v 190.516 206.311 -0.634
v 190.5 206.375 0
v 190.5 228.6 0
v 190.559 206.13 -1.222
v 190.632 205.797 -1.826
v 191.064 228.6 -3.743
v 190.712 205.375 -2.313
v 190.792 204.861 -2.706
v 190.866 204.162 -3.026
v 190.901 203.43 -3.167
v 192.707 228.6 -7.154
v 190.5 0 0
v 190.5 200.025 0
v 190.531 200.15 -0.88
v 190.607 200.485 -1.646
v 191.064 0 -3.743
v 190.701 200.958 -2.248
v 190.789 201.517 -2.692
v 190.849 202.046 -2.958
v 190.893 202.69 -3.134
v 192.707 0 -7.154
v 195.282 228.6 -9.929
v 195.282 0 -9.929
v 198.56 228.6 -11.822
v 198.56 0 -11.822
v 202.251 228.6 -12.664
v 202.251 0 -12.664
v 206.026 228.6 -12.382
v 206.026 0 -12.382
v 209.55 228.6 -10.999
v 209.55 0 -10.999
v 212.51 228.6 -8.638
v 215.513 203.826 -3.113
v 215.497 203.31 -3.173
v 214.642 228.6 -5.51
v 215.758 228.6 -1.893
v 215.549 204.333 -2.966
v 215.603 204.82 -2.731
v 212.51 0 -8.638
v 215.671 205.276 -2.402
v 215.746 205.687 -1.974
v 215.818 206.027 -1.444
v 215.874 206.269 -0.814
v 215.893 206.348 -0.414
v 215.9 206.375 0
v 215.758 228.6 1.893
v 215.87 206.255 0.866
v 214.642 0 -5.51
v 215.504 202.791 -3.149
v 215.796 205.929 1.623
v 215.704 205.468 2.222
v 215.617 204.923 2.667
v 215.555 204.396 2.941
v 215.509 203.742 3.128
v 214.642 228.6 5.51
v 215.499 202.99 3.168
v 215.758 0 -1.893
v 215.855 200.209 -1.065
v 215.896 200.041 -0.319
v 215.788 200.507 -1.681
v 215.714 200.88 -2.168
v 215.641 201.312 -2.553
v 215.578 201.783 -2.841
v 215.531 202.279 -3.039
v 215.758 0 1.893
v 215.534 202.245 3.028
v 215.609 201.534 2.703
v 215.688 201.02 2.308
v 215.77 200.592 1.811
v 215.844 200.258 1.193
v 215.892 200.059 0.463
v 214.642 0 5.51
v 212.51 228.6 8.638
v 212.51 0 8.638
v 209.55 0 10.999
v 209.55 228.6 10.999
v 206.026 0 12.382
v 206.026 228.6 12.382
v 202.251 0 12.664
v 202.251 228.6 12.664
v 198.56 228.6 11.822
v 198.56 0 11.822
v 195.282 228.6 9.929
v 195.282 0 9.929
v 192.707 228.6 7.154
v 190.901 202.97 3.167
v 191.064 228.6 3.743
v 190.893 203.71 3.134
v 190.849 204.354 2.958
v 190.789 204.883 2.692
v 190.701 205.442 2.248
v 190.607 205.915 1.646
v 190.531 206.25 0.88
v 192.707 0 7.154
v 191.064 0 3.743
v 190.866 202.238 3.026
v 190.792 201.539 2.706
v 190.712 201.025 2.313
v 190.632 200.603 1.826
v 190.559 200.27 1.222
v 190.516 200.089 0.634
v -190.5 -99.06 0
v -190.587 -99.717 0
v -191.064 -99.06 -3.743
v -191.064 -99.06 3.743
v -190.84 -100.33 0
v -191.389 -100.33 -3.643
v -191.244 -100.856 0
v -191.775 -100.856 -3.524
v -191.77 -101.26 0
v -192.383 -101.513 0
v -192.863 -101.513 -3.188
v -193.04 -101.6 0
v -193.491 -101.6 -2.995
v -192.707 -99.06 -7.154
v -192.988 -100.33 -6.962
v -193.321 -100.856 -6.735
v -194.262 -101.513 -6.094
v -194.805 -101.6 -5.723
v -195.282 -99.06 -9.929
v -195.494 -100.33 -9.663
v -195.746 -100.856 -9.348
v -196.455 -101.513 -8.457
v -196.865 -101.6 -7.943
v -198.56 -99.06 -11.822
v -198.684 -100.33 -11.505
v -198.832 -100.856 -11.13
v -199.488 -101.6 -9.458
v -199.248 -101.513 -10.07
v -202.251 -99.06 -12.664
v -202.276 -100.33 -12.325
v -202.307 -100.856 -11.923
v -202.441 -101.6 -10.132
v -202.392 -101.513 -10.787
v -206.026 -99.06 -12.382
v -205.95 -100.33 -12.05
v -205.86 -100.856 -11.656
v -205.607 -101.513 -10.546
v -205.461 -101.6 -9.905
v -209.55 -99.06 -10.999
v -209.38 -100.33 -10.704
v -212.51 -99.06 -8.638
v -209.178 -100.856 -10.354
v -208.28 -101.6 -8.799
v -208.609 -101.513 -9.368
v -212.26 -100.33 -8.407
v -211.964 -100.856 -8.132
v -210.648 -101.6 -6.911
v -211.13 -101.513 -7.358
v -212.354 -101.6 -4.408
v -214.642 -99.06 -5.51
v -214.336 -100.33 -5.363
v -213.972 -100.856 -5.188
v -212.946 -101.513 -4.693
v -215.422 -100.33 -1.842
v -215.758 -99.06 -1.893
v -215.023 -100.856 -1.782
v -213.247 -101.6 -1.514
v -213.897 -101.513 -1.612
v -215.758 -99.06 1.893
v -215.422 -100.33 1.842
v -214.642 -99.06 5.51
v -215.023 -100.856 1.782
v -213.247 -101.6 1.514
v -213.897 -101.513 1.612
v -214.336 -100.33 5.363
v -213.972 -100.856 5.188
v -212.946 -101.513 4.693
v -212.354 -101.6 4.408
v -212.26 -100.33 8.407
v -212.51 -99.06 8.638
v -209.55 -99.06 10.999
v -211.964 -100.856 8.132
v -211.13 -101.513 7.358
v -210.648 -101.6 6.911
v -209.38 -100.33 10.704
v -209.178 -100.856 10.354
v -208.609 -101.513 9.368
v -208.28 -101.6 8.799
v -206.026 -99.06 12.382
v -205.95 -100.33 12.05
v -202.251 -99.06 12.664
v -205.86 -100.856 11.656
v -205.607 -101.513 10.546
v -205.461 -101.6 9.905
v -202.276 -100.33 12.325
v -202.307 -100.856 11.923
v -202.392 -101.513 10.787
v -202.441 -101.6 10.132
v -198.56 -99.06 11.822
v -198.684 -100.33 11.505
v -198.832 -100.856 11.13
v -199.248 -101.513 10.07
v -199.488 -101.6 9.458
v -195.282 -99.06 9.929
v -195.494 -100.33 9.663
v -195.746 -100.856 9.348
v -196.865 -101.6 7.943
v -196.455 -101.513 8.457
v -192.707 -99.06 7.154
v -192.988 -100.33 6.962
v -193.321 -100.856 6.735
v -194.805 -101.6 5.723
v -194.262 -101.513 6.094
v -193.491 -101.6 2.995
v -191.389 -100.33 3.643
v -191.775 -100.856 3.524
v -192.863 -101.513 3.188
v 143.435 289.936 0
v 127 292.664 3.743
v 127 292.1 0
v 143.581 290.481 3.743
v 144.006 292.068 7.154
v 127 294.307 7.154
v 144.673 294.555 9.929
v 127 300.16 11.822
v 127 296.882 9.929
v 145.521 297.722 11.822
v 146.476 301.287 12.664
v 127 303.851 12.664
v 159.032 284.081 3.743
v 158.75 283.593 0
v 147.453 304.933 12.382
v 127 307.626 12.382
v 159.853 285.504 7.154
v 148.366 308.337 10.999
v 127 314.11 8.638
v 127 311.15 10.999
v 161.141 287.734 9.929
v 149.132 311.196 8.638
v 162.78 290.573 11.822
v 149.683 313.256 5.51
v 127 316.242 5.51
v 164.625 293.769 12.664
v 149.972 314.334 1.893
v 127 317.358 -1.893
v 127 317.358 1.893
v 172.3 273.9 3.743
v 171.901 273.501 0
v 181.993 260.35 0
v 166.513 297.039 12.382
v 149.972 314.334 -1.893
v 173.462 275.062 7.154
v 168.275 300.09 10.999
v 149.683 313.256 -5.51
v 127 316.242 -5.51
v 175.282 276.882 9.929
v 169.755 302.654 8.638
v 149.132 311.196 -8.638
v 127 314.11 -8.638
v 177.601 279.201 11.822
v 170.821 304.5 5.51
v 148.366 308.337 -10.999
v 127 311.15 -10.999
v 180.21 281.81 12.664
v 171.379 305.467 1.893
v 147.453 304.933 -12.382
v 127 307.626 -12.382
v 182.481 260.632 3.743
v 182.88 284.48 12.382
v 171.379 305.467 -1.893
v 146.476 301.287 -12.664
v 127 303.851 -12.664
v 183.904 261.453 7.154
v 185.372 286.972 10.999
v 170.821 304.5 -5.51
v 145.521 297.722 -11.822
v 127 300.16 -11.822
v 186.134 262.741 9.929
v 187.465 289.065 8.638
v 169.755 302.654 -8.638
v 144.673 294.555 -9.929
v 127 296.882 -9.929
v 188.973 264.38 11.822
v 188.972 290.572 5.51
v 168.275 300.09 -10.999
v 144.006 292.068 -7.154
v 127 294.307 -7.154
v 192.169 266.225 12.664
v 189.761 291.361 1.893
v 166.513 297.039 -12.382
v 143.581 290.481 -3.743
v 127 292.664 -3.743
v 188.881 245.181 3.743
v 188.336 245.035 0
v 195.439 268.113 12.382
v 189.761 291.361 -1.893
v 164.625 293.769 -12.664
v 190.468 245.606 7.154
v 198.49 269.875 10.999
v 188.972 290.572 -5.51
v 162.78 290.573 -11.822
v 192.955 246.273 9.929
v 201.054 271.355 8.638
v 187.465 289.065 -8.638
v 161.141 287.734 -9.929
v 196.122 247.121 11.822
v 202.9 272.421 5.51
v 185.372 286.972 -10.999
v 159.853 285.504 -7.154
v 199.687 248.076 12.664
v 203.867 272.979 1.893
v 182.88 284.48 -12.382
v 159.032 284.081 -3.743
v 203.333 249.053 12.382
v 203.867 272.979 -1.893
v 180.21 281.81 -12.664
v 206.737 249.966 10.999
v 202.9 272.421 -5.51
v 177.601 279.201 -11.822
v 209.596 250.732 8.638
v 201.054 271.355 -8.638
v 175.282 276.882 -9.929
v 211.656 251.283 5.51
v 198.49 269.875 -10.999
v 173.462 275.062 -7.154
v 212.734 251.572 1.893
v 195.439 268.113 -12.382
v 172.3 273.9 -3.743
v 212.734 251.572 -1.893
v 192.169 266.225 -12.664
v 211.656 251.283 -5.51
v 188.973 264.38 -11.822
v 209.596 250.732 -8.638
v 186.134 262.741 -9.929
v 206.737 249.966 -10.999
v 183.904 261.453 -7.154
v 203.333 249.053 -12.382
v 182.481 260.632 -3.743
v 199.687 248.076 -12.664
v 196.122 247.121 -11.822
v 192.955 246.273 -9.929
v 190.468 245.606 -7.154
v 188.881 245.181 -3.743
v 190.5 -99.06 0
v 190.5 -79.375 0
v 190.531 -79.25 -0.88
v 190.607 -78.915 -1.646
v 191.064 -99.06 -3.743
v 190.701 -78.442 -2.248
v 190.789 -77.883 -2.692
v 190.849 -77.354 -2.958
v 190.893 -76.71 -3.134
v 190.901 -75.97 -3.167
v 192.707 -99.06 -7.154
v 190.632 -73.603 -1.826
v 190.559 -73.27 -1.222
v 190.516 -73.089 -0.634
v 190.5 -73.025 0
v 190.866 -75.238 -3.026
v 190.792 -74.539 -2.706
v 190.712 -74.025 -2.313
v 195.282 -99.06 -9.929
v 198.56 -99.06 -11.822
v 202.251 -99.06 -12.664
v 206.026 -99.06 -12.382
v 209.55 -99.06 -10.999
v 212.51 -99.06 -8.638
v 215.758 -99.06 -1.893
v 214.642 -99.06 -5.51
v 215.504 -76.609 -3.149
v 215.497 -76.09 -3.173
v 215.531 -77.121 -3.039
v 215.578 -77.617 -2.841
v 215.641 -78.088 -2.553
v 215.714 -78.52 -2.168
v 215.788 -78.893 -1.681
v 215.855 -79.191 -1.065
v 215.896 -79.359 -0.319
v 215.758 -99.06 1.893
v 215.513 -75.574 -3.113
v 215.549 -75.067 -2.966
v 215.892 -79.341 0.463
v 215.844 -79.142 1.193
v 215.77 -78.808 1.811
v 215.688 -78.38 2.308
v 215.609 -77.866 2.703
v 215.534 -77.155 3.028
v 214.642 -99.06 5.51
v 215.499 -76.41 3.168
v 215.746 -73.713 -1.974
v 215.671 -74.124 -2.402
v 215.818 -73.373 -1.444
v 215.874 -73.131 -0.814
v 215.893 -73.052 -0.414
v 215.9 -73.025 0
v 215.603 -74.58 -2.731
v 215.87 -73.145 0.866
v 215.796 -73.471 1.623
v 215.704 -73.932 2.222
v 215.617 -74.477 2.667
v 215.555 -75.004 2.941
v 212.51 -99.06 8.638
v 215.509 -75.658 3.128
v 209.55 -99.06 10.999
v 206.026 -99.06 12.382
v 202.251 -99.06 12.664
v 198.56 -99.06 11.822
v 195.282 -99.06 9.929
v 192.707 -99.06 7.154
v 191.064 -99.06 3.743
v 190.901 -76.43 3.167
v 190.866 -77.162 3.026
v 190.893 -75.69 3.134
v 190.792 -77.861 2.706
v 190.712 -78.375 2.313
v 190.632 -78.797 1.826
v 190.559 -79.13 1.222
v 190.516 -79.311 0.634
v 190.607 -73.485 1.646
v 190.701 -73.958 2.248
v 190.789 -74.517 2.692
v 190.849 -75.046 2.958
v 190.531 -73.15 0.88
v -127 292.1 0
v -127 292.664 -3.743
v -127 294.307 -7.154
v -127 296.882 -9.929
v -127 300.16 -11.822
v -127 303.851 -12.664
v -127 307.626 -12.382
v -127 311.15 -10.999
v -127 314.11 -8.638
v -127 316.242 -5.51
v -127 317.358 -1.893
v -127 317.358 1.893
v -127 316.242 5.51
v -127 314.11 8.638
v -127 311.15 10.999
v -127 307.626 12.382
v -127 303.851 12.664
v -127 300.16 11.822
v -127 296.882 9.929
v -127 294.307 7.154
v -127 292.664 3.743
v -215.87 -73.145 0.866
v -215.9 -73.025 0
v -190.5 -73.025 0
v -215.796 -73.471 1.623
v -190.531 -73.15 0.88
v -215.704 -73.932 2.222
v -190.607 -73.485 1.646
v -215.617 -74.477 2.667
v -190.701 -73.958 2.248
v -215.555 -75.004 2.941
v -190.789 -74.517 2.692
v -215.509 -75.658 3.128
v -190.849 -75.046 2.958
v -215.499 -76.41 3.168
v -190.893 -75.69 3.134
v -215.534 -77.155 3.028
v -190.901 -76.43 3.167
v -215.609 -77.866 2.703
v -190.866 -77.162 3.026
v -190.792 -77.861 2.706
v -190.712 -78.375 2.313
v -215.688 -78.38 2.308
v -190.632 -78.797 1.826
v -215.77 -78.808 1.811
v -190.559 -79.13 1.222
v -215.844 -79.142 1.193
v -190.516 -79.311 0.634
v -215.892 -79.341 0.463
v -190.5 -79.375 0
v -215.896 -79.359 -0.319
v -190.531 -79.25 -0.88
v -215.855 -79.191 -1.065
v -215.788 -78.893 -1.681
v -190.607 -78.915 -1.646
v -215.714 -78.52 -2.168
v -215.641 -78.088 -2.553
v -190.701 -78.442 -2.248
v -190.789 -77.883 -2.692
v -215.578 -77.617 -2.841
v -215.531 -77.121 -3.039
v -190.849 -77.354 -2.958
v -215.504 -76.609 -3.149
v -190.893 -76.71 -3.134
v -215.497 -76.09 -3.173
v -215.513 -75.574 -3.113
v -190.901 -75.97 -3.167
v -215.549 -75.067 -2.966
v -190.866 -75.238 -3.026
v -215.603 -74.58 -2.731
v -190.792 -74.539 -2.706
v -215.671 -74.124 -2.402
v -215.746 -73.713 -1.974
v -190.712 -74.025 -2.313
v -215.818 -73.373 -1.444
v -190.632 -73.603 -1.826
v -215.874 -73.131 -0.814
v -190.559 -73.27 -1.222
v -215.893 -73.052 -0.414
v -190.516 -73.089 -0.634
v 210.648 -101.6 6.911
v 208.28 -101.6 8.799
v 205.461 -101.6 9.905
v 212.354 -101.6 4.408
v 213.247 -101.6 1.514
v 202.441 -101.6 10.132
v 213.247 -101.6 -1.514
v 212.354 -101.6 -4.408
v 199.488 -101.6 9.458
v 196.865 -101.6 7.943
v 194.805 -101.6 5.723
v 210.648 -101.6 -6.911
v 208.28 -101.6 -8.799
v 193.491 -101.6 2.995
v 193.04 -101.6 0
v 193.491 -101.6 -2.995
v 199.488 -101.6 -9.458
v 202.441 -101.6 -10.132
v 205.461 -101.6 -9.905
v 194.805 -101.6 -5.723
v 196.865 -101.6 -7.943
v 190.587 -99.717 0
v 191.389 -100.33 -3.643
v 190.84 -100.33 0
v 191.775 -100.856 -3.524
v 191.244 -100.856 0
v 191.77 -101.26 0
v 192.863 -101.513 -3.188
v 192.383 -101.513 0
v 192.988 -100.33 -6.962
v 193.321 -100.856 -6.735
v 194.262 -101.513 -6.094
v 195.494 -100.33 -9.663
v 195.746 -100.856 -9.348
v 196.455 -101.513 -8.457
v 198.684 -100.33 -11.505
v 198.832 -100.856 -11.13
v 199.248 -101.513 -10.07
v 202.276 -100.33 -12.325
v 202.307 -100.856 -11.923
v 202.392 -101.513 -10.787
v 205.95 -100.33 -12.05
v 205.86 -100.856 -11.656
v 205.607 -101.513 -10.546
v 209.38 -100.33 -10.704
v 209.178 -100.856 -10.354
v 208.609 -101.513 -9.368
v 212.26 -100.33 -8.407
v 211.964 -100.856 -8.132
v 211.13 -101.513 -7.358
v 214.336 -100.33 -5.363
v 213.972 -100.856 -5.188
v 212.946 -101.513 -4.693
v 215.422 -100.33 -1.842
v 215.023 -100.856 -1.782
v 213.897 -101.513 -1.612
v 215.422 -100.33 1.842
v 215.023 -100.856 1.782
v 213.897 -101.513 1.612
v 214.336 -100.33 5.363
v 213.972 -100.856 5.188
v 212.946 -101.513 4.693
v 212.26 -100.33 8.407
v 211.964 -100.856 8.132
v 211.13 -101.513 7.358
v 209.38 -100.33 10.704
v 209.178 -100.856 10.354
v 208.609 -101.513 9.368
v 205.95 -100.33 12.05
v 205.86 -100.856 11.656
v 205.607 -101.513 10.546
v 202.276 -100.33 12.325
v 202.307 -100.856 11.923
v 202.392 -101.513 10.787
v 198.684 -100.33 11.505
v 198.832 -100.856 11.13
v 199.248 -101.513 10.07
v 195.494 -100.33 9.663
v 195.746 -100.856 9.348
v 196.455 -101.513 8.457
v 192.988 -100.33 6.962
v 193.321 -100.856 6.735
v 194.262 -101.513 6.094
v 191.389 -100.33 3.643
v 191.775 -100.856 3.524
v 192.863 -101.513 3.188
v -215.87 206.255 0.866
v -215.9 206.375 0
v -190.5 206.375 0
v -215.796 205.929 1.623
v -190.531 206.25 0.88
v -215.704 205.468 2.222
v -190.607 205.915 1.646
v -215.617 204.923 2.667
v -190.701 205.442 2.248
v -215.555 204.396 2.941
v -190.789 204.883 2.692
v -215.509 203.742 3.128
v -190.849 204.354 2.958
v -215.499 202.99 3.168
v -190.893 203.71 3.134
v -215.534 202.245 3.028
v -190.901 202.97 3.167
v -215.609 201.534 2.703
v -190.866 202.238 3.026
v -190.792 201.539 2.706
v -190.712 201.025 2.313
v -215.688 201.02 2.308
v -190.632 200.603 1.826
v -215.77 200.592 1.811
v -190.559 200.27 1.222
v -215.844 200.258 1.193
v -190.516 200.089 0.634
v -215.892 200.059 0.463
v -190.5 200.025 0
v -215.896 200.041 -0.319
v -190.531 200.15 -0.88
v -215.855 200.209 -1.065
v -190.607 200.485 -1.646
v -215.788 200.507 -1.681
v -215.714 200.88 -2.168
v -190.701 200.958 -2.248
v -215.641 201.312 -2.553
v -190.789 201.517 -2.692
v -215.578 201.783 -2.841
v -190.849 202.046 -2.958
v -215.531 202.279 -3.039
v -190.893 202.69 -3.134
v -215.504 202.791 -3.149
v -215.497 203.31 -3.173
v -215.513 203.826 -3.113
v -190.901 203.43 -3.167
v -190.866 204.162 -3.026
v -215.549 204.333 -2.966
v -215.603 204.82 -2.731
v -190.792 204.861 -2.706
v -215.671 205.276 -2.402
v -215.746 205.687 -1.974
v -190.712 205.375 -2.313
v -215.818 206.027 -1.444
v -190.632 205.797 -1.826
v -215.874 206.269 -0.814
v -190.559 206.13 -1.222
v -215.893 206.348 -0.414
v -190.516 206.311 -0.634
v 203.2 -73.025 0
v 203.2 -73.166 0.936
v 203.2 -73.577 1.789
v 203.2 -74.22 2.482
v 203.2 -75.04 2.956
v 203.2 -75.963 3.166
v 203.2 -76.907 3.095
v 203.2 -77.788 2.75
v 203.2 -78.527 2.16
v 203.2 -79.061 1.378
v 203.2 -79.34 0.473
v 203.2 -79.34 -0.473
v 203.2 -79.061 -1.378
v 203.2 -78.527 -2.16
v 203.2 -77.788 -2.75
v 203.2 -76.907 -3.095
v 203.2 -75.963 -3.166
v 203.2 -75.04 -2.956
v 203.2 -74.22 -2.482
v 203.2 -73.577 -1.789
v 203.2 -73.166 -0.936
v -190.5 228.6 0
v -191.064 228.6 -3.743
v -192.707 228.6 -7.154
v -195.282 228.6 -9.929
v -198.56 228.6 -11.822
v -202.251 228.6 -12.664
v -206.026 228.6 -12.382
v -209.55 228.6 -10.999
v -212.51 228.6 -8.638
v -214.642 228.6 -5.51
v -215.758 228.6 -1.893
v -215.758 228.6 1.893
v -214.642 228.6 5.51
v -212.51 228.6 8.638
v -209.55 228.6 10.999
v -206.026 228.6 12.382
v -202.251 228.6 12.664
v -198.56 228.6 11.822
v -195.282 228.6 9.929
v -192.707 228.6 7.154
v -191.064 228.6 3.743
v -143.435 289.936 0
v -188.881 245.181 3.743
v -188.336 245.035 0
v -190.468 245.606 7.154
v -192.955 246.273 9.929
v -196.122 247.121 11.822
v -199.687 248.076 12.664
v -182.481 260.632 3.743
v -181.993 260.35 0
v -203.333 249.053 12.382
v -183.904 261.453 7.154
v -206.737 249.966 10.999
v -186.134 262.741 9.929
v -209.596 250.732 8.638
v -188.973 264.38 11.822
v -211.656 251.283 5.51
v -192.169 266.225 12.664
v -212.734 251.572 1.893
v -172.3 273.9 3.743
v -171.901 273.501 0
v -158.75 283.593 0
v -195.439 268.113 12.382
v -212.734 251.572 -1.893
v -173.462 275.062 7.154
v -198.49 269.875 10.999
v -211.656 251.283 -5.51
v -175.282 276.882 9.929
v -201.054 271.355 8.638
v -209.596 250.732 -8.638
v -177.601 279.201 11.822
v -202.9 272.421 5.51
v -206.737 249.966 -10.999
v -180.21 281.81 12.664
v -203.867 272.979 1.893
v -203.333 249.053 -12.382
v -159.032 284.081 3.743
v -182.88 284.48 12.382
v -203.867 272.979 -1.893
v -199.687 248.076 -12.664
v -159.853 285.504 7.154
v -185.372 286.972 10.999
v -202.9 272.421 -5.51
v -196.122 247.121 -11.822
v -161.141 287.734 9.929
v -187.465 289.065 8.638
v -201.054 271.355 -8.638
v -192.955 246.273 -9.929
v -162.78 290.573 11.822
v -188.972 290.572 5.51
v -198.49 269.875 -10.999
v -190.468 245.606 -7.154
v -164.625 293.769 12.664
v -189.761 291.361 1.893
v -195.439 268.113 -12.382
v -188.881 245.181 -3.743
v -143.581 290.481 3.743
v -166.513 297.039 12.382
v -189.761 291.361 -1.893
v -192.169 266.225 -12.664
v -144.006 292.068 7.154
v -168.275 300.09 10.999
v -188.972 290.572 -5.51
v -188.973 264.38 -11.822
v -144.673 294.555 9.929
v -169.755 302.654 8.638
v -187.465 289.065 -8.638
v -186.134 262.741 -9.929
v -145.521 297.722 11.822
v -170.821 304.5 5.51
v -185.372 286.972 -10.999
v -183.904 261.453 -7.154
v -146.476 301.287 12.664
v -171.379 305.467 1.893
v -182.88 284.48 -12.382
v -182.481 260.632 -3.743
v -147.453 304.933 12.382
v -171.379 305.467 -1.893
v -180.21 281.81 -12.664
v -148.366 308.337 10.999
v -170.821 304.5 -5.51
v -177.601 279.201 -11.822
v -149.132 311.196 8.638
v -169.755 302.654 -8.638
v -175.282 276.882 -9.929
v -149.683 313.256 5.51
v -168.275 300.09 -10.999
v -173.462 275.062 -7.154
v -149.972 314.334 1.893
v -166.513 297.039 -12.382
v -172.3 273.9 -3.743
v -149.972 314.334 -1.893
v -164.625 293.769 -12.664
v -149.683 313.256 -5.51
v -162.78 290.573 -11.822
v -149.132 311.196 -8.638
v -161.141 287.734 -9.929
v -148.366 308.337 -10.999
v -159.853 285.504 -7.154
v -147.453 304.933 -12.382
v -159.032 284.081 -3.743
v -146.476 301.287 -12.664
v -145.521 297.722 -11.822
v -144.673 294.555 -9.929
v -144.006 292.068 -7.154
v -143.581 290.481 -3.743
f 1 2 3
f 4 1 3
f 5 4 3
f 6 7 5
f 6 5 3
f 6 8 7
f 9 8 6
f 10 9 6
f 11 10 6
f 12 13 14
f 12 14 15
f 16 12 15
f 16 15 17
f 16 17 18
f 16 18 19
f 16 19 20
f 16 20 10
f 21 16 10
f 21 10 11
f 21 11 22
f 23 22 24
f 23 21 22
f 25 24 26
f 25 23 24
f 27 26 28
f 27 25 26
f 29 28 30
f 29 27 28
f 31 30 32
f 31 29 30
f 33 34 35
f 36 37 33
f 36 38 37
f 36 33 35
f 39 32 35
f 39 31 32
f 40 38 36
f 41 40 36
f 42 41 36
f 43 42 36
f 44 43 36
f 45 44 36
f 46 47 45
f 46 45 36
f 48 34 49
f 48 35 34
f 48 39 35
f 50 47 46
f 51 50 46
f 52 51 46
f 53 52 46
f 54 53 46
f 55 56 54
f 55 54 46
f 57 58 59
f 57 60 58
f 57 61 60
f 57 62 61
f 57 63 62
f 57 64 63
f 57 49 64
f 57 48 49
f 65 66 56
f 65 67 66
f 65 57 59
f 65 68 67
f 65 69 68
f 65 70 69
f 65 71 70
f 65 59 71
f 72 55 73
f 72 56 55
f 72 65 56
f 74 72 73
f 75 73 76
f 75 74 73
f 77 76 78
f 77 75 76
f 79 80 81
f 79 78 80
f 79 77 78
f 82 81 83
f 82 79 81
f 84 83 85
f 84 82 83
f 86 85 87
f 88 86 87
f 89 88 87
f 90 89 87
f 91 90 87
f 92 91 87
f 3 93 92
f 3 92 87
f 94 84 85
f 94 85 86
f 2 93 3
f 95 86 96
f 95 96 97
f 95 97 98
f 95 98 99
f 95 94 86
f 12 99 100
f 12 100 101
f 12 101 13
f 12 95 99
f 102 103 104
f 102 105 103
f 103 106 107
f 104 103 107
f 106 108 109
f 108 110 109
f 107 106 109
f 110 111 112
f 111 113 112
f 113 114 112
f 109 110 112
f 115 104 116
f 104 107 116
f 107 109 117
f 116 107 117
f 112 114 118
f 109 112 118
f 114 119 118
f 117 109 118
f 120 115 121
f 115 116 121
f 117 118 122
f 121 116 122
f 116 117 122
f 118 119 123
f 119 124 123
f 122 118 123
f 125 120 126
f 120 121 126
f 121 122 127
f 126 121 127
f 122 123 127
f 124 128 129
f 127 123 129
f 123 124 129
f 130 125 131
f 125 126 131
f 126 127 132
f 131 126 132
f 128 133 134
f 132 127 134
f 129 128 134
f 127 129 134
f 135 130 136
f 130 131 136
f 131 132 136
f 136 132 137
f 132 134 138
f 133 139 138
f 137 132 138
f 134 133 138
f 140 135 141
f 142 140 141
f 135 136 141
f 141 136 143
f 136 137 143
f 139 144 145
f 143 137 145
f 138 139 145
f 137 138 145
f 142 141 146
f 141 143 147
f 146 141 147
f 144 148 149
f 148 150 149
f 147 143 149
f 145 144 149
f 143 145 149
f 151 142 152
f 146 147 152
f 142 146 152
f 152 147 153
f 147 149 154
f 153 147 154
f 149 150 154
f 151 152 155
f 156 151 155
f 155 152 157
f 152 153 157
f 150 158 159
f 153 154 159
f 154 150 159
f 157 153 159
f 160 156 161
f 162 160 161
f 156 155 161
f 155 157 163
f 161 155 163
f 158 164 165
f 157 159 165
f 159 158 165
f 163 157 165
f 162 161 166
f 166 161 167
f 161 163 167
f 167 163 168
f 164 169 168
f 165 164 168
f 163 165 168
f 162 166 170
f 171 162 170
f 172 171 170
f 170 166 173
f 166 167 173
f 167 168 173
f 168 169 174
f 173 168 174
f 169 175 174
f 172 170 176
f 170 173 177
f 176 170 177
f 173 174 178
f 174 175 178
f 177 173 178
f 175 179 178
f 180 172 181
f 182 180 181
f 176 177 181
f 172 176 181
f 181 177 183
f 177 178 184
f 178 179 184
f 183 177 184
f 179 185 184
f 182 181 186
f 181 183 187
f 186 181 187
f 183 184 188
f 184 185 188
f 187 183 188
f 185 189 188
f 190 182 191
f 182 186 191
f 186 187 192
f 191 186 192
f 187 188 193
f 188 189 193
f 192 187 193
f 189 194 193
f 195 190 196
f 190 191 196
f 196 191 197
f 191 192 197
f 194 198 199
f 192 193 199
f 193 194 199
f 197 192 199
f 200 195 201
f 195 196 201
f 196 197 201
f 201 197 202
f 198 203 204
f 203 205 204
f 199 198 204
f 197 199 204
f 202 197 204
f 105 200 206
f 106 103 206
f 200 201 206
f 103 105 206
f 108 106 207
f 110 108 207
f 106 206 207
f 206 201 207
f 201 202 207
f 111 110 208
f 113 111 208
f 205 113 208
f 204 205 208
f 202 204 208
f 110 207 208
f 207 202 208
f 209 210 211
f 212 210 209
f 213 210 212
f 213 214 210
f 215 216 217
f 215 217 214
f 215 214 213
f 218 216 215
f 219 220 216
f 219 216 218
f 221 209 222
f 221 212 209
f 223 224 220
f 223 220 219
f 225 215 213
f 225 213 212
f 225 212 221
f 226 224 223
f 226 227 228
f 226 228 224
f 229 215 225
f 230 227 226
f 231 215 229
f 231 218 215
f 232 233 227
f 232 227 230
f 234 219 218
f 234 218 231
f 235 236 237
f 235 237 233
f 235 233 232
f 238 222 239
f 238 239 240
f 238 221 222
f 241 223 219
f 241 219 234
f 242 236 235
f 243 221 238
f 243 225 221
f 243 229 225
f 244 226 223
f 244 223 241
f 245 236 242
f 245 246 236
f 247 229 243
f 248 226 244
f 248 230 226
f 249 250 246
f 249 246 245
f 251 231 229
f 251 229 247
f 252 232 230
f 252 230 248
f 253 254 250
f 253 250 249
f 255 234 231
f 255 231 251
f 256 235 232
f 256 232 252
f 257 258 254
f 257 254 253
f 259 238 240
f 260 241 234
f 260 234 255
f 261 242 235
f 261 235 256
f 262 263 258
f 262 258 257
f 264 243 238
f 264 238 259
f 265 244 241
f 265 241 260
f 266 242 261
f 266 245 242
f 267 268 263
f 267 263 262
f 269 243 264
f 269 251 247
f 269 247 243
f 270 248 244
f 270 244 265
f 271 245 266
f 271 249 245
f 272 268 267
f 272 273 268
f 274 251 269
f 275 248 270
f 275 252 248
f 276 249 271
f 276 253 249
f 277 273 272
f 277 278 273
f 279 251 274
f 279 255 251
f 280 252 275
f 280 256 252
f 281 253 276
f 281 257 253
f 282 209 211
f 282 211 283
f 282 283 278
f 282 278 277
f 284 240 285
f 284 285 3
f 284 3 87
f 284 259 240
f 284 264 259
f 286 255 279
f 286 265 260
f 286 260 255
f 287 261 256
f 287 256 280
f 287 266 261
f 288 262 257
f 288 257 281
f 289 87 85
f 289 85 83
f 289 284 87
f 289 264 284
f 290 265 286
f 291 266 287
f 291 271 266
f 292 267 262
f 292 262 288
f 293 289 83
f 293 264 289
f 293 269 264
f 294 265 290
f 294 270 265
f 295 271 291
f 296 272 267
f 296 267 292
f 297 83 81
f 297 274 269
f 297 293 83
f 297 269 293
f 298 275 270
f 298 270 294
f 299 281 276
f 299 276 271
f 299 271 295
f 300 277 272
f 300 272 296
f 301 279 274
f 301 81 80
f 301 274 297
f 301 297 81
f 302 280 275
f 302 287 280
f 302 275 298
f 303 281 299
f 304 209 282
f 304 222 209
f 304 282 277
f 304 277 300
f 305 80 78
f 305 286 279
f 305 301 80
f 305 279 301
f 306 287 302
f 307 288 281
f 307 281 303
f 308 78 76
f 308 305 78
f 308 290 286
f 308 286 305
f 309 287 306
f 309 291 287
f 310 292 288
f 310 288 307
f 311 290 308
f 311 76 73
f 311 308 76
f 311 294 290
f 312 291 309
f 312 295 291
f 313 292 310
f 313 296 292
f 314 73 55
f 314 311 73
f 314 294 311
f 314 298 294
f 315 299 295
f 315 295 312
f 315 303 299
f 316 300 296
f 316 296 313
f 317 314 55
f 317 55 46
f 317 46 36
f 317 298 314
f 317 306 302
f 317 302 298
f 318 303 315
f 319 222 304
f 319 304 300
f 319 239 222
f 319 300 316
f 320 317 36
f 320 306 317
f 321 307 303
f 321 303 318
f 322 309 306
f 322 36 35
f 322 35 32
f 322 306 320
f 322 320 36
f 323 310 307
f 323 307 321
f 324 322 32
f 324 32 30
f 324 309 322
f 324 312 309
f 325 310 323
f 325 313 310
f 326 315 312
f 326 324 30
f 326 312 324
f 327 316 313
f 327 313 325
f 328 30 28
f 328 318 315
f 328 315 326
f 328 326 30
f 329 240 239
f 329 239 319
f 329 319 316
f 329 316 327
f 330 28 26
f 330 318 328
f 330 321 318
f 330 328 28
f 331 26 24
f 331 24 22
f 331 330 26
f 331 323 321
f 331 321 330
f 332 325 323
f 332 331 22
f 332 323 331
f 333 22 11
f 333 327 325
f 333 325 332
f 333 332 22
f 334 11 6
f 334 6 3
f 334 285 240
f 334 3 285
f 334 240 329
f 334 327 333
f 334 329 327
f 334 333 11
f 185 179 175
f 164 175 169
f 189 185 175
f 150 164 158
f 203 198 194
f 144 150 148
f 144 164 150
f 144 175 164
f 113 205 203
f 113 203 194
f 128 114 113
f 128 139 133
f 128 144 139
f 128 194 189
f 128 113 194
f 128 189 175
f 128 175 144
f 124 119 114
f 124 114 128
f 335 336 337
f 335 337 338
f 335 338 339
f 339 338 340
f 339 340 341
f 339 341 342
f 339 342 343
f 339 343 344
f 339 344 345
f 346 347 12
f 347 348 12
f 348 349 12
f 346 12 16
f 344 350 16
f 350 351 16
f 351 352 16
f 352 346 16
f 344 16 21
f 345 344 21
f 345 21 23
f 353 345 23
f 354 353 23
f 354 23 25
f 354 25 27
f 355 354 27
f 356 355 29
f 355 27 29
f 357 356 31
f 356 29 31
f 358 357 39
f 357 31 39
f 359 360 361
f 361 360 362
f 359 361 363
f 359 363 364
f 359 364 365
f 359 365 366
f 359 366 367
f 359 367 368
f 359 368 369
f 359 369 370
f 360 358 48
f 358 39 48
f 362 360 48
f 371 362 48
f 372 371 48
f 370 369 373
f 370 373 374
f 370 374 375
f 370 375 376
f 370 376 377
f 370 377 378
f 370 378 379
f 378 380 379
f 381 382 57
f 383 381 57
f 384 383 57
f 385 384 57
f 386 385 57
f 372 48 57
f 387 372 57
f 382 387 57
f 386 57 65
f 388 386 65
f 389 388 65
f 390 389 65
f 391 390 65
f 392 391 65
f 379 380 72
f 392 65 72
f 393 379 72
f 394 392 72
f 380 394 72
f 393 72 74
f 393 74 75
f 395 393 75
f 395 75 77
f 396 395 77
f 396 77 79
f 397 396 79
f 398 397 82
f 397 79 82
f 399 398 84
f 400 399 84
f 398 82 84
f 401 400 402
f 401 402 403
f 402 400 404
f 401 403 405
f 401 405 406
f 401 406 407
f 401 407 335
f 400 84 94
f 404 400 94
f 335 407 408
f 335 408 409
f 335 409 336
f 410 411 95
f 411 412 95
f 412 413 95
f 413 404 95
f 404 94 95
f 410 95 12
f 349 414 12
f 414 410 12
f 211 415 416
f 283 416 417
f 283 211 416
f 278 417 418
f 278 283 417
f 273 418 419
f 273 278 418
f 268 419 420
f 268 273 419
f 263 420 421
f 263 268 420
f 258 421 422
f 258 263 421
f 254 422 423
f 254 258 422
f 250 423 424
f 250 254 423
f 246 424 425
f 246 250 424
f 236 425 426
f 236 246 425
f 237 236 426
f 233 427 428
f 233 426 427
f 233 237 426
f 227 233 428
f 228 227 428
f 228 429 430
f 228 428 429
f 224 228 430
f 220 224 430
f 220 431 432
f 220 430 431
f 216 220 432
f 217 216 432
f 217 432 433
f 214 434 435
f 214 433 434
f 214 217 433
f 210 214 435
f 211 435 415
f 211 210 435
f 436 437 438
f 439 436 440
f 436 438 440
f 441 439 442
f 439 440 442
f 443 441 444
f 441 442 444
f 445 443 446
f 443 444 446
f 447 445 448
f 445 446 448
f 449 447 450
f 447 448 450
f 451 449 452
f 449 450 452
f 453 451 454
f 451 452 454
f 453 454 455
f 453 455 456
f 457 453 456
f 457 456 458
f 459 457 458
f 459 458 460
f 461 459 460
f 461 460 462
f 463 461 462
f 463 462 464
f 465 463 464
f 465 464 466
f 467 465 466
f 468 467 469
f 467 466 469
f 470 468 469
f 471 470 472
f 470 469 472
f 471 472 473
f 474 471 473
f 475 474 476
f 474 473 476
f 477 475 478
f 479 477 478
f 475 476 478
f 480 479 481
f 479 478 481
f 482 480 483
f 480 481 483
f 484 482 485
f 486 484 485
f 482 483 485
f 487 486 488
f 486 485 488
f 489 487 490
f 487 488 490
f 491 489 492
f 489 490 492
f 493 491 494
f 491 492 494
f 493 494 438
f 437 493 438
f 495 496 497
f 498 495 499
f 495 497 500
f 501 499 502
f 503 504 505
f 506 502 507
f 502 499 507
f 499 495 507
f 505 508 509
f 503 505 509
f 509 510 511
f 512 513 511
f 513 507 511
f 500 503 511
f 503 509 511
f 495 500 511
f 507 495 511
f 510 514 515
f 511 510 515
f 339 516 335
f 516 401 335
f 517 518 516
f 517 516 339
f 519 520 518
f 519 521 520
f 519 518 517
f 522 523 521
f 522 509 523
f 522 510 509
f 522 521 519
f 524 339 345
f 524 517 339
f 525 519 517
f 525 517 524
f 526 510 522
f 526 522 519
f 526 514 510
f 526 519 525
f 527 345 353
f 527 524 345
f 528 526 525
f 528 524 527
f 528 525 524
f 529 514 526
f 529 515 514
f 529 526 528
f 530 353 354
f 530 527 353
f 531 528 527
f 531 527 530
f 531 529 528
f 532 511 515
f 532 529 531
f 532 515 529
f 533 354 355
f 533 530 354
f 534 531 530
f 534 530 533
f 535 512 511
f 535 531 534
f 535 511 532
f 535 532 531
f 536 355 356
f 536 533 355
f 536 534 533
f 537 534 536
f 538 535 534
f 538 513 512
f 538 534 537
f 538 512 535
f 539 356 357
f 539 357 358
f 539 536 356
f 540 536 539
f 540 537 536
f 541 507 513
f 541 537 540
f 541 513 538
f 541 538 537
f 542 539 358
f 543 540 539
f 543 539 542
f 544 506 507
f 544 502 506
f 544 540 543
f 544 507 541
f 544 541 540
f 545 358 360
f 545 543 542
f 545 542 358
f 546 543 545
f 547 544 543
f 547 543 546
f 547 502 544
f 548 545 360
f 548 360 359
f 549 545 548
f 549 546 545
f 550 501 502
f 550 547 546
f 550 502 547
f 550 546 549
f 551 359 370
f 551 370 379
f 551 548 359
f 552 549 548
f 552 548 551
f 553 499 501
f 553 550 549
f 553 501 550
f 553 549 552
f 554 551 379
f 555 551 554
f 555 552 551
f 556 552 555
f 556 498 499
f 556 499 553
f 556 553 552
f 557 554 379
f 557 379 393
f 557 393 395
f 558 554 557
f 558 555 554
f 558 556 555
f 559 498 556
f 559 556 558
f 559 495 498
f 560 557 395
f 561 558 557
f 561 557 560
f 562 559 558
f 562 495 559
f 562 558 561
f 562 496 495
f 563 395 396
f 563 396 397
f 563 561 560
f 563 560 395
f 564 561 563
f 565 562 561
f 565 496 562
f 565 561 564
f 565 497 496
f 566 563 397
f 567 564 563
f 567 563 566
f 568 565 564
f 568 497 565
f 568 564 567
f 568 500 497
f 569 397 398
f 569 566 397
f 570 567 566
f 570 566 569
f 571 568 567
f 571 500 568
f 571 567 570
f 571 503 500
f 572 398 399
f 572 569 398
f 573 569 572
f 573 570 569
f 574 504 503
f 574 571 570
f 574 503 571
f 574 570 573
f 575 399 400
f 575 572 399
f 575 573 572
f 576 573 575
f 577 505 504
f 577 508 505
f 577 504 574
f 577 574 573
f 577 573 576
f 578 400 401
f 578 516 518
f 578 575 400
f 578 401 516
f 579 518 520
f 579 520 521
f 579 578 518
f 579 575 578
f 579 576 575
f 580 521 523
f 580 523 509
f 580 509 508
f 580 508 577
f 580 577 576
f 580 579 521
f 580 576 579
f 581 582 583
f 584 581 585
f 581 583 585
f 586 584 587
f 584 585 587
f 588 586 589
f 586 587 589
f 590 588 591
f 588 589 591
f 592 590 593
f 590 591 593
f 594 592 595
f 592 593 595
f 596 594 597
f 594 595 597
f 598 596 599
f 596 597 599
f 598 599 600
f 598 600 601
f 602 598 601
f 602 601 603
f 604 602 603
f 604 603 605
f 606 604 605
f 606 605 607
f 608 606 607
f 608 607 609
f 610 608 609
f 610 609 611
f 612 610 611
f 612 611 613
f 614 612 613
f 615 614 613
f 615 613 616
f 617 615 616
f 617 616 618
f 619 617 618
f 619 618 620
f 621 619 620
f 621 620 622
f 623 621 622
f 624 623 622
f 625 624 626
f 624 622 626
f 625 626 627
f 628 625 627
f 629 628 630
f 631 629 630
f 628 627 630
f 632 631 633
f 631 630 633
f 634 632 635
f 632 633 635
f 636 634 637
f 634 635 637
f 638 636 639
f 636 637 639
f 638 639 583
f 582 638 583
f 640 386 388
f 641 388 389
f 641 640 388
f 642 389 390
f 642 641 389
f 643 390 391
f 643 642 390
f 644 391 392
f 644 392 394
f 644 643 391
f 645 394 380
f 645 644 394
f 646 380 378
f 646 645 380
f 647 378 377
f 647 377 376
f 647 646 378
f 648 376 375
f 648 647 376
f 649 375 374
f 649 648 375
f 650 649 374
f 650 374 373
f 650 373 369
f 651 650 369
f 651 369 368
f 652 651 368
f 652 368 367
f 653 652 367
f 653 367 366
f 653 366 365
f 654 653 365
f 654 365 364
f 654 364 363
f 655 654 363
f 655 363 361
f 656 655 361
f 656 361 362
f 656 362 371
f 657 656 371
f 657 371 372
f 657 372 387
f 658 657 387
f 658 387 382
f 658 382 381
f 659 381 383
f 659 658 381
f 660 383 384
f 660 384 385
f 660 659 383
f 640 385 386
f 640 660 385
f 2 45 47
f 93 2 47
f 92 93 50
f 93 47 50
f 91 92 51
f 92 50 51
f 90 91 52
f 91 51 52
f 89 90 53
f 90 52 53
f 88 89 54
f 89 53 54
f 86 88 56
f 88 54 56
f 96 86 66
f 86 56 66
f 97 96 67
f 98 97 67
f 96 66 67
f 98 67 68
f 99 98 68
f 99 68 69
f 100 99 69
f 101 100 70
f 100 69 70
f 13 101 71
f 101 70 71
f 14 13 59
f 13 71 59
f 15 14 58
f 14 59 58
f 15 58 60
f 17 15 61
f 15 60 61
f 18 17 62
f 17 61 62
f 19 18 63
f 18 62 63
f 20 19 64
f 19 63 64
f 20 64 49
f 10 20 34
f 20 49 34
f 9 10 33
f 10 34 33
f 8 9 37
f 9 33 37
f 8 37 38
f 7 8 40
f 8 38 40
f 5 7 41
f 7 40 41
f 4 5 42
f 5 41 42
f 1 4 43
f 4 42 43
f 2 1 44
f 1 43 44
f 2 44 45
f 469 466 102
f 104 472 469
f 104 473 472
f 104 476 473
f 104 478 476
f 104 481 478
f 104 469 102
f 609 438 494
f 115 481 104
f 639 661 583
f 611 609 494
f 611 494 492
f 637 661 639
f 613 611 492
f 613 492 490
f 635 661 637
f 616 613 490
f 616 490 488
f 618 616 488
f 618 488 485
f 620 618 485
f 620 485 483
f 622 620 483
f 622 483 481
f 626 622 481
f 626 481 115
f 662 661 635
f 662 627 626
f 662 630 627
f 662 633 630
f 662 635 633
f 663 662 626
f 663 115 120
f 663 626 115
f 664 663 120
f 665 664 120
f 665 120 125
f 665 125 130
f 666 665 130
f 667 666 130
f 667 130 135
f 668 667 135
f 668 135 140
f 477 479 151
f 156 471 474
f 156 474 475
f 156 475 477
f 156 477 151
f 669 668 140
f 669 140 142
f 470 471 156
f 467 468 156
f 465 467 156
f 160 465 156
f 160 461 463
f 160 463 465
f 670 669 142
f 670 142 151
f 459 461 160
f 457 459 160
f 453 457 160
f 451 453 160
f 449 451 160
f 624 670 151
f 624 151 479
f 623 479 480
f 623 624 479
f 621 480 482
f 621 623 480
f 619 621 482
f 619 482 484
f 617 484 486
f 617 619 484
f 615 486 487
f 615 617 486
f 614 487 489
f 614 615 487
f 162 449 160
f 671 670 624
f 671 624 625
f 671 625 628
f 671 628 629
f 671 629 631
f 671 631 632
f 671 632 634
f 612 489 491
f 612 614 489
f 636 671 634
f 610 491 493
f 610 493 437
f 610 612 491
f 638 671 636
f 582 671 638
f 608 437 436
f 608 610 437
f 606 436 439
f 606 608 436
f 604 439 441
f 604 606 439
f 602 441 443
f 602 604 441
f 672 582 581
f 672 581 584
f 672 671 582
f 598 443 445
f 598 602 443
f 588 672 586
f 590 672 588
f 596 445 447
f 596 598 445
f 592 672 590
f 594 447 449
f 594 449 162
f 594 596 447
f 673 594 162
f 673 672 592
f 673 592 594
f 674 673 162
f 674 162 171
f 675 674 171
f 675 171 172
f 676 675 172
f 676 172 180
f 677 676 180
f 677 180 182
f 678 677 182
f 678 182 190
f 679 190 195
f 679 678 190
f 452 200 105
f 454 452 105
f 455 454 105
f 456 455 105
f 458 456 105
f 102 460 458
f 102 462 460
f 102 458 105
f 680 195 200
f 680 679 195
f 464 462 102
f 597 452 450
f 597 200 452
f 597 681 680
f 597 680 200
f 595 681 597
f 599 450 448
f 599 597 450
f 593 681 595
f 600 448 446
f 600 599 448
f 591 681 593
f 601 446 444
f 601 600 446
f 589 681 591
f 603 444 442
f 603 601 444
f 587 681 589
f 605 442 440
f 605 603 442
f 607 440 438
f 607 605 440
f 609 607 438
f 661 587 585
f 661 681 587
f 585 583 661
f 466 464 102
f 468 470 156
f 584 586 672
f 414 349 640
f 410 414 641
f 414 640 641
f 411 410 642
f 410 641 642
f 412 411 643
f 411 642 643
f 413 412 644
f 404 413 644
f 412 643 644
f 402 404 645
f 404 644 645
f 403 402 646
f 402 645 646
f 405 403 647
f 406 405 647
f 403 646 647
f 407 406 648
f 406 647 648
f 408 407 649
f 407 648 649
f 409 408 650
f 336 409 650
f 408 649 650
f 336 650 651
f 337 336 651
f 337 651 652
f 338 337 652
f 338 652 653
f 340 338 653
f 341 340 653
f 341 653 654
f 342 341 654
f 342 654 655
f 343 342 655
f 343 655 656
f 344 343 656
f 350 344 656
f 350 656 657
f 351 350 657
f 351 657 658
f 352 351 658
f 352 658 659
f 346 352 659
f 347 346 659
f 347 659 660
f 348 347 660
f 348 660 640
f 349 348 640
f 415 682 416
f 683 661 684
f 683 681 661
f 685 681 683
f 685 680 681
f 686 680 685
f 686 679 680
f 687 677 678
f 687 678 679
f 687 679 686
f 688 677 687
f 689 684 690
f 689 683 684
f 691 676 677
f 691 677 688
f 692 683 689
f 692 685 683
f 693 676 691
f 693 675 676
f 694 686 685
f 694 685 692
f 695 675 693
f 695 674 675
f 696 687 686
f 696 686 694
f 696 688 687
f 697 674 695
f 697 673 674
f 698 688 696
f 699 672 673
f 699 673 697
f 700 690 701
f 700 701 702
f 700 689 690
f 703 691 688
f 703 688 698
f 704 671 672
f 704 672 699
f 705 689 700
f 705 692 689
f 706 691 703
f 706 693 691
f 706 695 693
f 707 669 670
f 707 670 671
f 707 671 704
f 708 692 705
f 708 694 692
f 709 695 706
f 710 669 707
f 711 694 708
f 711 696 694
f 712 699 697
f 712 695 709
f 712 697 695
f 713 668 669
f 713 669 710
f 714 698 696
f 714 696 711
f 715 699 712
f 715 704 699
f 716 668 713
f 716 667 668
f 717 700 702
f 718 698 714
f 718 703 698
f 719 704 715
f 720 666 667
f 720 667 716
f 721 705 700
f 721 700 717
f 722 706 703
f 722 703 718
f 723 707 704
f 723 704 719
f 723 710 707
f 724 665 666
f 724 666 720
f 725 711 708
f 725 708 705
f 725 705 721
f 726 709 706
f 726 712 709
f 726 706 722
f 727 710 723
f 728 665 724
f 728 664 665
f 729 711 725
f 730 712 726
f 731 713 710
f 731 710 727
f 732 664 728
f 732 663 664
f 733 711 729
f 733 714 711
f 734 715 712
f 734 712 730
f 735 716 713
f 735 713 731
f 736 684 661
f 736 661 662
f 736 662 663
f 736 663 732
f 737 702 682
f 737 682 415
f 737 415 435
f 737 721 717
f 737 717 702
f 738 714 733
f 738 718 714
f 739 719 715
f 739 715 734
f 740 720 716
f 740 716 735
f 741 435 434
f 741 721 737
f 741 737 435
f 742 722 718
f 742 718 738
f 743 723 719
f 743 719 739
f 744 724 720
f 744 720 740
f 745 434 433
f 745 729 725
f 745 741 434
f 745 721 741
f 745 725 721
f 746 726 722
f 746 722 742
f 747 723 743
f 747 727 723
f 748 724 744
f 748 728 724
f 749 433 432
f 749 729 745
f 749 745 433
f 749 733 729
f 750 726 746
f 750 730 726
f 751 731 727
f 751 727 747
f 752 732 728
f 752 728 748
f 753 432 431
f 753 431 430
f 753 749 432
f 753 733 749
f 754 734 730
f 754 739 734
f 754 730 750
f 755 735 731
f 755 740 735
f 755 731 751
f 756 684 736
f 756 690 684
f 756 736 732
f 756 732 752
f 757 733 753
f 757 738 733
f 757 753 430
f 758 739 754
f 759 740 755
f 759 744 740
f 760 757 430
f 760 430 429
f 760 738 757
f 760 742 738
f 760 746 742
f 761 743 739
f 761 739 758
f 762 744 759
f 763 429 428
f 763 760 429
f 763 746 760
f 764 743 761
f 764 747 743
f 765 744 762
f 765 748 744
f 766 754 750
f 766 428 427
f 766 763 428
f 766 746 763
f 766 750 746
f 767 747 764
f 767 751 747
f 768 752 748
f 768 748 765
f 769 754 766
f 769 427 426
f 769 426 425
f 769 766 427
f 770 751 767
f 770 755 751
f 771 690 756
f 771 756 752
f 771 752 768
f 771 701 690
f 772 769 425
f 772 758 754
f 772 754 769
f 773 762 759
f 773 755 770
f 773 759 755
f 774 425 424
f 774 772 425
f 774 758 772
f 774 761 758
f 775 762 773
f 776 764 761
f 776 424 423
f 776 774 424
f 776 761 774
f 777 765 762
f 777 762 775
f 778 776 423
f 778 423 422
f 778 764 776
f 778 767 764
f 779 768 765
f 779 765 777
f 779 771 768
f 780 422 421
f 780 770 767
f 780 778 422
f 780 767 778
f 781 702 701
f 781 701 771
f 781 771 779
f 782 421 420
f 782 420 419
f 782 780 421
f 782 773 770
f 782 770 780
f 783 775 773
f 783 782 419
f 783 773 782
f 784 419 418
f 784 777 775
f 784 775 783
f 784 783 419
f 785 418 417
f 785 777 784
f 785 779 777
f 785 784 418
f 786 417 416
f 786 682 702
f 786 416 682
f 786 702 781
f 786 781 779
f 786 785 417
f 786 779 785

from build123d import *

# Parameters (mm, degrees)
F2_R          = 12.7
F6_DEPTH      = 19.05
F6_DEPTH_BACK = 430.53
F8_R          = 3.175
F9_DEPTH      = 19.05
F9_DEPTH_BACK = 425.958
F10_R         = 2.54


with BuildPart() as f3:
    # F3: sweep along a path in F1
    with BuildLine(Plane.XY) as f3_path:
        Line((-203.2, -101.6), (-203.2, 0))
        Line((-203.2, 0), (-203.2, 228.6))
        ThreePointArc((-203.2, 228.6), (-180.8815367264, 282.4815367264), (-127, 304.8))
        Line((-127, 304.8), (0, 304.8))
        Line((0, 304.8), (127, 304.8))
        ThreePointArc((127, 304.8), (180.8815367264, 282.4815367264), (203.2, 228.6))
        Line((203.2, 228.6), (203.2, 0))
    # F2 (on offset) → F3 (sweep)
    with BuildSketch(Plane.XZ.offset(101.6)):
        with Locations((-203.2, 0)):
            Circle(F2_R)
    sweep(path=f3_path.line)

    # F5 (on offset) → F6 (cut, two sides)
    with BuildSketch(Plane.YZ.offset(203.2)) as f6_sk:
        with BuildLine():
            ThreePointArc((200.025, 0), (203.2, -3.175), (206.375, 0))
            ThreePointArc((206.375, 0), (203.2, 3.175), (200.025, 0))
        make_face()
    extrude(amount=F6_DEPTH, mode=Mode.SUBTRACT)
    extrude(f6_sk.sketch, amount=-F6_DEPTH_BACK, mode=Mode.SUBTRACT)

    # F7: F3 across plane


with BuildPart() as f3_1:
    add(f3.part)
    add(f3.part.mirror(Plane.YZ))

    # F8 (on offset) → F9 (cut, two sides)
    with BuildSketch(Plane.YZ.offset(203.2)) as f9_sk:
        with Locations((-76.2, 0)):
            Circle(F8_R)
    extrude(amount=F9_DEPTH, mode=Mode.SUBTRACT)
    extrude(f9_sk.sketch, amount=-F9_DEPTH_BACK, mode=Mode.SUBTRACT)

    # F10
    f10_edges = [f3_1.edges().sort_by_distance(p)[0] for p in [
        (-215.9, -101.6, 0),
        (215.9, -101.6, 0),
    ]]
    fillet(f10_edges, radius=F10_R)


solid = f3_1.part
